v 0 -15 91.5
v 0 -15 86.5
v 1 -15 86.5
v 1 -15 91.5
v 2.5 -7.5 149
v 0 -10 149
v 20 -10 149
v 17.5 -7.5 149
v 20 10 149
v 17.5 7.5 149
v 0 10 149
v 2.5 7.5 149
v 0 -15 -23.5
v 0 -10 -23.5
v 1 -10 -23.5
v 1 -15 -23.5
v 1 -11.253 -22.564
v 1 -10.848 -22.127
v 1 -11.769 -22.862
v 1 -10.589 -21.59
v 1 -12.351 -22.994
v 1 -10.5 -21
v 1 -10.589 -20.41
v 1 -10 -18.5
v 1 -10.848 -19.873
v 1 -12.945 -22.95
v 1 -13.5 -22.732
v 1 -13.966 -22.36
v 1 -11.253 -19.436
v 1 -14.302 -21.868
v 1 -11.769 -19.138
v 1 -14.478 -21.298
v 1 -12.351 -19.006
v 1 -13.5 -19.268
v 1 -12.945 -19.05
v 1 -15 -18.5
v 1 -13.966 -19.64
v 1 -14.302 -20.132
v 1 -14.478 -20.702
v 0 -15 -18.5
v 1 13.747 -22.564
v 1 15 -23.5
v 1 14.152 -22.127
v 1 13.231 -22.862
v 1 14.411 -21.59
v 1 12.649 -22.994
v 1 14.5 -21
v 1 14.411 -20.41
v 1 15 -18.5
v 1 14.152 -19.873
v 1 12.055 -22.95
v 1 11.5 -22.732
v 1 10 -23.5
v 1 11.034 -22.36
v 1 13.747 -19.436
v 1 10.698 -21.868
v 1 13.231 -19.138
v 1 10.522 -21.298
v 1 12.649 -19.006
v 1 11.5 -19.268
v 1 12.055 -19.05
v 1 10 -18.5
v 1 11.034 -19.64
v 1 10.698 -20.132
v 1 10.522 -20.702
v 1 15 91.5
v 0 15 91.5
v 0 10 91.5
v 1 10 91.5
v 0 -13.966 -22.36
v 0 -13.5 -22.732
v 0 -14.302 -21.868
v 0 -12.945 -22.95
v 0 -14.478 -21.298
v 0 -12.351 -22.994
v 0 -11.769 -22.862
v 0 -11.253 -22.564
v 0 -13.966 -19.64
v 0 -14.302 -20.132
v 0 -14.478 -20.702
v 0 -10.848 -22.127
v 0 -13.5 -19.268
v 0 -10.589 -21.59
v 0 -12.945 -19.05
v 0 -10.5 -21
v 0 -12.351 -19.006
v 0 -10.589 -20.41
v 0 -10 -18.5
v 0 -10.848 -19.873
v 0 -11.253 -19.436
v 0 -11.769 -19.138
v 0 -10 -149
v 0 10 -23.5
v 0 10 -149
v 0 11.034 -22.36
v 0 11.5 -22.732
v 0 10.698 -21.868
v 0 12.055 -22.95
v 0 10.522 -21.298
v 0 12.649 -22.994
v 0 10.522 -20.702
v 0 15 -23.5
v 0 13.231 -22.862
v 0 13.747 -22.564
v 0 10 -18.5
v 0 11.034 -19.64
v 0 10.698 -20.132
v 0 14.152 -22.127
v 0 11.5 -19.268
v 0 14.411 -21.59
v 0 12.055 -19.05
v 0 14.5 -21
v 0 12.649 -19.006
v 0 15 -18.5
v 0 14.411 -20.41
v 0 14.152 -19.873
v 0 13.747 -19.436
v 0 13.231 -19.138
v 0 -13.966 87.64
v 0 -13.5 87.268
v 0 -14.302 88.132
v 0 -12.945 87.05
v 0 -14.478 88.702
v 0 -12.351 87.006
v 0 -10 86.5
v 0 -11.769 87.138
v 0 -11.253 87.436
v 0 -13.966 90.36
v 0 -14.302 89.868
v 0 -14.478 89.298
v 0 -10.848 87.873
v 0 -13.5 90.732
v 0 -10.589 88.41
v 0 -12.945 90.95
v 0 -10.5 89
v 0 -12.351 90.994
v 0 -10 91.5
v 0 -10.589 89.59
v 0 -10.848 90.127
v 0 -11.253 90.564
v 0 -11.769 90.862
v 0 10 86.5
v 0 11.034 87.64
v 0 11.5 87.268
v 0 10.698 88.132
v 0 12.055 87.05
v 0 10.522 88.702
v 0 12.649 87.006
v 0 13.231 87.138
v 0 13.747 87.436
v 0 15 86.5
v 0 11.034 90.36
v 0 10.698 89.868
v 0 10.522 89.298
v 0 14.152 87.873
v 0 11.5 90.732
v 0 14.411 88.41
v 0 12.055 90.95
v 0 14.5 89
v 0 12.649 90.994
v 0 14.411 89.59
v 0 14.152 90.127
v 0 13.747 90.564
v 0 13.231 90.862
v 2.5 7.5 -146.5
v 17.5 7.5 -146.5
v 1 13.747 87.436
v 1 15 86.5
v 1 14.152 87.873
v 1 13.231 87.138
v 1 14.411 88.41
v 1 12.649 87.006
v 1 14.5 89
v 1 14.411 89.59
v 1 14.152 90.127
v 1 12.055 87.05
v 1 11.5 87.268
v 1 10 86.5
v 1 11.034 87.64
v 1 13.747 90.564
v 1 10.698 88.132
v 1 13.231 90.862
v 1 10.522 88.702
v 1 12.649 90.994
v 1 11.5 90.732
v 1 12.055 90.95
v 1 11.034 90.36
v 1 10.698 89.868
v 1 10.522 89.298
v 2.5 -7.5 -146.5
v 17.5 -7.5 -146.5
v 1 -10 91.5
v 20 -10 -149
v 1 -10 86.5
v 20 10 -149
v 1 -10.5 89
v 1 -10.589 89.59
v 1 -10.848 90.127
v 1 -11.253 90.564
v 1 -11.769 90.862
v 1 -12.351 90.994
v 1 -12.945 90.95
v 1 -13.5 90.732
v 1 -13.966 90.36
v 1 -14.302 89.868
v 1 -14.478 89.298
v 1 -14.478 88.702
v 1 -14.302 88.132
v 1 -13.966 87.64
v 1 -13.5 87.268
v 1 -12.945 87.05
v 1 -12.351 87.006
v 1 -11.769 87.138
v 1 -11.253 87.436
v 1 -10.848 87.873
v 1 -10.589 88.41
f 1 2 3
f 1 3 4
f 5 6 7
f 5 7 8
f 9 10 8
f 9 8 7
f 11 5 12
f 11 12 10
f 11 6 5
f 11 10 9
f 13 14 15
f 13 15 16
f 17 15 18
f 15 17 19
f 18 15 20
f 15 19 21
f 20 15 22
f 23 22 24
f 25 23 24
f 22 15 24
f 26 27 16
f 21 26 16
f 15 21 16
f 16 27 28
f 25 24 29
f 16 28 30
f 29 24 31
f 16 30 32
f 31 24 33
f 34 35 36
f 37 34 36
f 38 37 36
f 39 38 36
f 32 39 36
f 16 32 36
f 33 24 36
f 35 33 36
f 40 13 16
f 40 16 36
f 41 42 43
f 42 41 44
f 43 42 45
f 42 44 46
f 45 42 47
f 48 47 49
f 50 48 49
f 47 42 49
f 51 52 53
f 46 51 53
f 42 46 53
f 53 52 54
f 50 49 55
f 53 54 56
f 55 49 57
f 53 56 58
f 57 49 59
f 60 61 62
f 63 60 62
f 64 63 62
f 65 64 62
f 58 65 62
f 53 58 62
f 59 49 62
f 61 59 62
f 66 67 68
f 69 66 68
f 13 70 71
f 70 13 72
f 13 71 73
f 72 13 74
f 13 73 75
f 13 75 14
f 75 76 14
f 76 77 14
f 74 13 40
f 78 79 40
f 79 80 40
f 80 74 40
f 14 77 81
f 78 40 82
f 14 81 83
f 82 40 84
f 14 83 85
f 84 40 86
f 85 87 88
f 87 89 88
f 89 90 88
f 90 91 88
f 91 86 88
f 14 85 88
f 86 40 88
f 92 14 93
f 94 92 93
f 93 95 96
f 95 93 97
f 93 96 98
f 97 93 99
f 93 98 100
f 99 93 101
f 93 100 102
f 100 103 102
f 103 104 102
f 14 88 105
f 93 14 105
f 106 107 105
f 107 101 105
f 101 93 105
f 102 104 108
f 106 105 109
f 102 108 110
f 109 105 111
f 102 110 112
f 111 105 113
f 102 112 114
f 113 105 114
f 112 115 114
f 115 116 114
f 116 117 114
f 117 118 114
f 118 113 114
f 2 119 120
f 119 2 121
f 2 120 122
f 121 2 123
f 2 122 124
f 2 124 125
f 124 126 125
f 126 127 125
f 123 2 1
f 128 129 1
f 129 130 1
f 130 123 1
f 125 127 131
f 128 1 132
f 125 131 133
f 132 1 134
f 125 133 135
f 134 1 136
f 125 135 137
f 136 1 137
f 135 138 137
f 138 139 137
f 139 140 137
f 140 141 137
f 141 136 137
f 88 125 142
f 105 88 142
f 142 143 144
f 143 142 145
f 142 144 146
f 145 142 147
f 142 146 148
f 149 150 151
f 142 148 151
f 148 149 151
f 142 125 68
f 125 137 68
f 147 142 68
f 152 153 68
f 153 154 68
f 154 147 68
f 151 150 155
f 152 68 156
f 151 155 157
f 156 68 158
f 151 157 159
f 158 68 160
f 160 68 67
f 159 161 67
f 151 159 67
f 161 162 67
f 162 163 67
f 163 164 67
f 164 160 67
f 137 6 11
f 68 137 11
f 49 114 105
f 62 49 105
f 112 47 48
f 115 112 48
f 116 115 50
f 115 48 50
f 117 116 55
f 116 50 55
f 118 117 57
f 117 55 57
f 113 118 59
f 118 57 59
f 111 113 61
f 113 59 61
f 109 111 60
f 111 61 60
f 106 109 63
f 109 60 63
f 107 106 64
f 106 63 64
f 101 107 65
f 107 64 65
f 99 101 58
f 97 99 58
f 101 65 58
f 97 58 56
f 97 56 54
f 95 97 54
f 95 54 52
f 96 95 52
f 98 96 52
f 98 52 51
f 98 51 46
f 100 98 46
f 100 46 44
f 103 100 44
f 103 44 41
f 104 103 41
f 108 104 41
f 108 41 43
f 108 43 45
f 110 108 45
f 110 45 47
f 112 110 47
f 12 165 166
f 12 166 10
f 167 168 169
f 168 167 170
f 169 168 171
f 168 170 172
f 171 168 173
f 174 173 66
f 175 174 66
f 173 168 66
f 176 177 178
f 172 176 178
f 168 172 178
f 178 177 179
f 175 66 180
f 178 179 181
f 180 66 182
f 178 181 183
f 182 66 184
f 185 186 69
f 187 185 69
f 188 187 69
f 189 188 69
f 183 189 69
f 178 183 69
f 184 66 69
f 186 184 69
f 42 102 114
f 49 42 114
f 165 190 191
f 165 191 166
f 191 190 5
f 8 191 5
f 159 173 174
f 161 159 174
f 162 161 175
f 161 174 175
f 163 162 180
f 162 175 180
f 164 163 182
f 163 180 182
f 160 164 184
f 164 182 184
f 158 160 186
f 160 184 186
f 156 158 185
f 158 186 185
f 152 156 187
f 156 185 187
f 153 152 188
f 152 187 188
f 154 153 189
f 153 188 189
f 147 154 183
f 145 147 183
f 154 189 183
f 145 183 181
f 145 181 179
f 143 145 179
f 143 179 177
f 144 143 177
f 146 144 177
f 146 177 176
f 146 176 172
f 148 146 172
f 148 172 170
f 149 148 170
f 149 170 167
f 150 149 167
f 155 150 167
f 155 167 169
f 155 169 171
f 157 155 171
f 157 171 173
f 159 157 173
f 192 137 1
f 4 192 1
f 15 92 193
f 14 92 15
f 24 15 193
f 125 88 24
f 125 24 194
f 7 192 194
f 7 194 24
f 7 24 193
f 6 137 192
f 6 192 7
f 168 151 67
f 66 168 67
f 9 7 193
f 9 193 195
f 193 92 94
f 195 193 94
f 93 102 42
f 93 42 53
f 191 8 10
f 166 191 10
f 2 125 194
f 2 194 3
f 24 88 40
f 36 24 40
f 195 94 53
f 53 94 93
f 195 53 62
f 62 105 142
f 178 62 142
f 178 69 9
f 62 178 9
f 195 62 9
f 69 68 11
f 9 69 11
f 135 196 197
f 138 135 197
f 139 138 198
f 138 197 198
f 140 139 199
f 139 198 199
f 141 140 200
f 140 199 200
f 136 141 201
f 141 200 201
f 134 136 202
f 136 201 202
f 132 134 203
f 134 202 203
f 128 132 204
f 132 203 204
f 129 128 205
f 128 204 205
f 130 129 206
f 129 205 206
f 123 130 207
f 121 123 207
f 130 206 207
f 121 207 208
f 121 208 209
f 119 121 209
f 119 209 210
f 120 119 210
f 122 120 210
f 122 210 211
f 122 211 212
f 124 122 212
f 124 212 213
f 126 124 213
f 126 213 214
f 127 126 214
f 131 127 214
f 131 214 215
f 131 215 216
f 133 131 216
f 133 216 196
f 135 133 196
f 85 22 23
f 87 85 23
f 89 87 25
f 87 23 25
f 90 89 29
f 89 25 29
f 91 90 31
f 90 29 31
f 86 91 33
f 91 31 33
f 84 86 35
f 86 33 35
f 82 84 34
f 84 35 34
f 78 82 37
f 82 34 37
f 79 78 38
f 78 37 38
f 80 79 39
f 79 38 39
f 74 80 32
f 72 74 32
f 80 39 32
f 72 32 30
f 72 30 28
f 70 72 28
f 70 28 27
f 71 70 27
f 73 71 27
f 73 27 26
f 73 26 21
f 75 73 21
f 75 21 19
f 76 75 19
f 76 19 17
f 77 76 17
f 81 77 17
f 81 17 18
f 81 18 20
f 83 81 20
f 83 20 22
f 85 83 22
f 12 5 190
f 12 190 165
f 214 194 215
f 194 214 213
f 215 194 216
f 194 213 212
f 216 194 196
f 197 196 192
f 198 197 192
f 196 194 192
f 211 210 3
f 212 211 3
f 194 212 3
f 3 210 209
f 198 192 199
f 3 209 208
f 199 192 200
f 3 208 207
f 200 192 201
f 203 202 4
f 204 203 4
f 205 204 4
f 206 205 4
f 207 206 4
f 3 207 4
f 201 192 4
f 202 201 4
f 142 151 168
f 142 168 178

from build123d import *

# Parameters (mm, degrees)
F0_W     = 20
F0_H     = 298
F1_DEPTH = 20
F2_T     = -2.5
F3_W     = 5
F3_H     = 5
F4_DEPTH = 1
F5_D     = 4


# Not quite as in the source:
# - a feature names something its author has since deleted; it is built from what else it names


with BuildPart() as f1:
    # F0 (on Right) → F1 (new body)
    with BuildSketch(Plane.YZ):
        Rectangle(F0_W, F0_H)
    extrude(amount=F1_DEPTH)

    # F2
    f2_openings = [f1.faces().sort_by_distance(p)[0] for p in [
        (10, 0, 149),
    ]]
    offset(amount=F2_T, openings=f2_openings)

    # F3 (on face) → F4 (join)
    with BuildSketch(Plane(origin=(0, 0, 0), x_dir=(0, -1, 0), z_dir=(-1, 0, 0))):
        with Locations((12.5, 89)):
            Rectangle(F3_W, F3_H)
        with Locations((-12.5, 89)):
            Rectangle(F3_W, F3_H)
        with Locations((-12.5, -21)):
            Rectangle(F3_W, F3_H)
        with Locations((12.5, -21)):
            Rectangle(F3_W, F3_H)
    extrude(amount=-F4_DEPTH)

    # F5 (through all)
    with Locations(Plane(origin=(0, 0, 0), x_dir=(0, -1, 0), z_dir=(-1, 0, 0))):
        with Locations((-12.5, 89), (12.5, 89), (-12.5, -21), (12.5, -21)):
            Hole(F5_D / 2)


solid = f1.part
